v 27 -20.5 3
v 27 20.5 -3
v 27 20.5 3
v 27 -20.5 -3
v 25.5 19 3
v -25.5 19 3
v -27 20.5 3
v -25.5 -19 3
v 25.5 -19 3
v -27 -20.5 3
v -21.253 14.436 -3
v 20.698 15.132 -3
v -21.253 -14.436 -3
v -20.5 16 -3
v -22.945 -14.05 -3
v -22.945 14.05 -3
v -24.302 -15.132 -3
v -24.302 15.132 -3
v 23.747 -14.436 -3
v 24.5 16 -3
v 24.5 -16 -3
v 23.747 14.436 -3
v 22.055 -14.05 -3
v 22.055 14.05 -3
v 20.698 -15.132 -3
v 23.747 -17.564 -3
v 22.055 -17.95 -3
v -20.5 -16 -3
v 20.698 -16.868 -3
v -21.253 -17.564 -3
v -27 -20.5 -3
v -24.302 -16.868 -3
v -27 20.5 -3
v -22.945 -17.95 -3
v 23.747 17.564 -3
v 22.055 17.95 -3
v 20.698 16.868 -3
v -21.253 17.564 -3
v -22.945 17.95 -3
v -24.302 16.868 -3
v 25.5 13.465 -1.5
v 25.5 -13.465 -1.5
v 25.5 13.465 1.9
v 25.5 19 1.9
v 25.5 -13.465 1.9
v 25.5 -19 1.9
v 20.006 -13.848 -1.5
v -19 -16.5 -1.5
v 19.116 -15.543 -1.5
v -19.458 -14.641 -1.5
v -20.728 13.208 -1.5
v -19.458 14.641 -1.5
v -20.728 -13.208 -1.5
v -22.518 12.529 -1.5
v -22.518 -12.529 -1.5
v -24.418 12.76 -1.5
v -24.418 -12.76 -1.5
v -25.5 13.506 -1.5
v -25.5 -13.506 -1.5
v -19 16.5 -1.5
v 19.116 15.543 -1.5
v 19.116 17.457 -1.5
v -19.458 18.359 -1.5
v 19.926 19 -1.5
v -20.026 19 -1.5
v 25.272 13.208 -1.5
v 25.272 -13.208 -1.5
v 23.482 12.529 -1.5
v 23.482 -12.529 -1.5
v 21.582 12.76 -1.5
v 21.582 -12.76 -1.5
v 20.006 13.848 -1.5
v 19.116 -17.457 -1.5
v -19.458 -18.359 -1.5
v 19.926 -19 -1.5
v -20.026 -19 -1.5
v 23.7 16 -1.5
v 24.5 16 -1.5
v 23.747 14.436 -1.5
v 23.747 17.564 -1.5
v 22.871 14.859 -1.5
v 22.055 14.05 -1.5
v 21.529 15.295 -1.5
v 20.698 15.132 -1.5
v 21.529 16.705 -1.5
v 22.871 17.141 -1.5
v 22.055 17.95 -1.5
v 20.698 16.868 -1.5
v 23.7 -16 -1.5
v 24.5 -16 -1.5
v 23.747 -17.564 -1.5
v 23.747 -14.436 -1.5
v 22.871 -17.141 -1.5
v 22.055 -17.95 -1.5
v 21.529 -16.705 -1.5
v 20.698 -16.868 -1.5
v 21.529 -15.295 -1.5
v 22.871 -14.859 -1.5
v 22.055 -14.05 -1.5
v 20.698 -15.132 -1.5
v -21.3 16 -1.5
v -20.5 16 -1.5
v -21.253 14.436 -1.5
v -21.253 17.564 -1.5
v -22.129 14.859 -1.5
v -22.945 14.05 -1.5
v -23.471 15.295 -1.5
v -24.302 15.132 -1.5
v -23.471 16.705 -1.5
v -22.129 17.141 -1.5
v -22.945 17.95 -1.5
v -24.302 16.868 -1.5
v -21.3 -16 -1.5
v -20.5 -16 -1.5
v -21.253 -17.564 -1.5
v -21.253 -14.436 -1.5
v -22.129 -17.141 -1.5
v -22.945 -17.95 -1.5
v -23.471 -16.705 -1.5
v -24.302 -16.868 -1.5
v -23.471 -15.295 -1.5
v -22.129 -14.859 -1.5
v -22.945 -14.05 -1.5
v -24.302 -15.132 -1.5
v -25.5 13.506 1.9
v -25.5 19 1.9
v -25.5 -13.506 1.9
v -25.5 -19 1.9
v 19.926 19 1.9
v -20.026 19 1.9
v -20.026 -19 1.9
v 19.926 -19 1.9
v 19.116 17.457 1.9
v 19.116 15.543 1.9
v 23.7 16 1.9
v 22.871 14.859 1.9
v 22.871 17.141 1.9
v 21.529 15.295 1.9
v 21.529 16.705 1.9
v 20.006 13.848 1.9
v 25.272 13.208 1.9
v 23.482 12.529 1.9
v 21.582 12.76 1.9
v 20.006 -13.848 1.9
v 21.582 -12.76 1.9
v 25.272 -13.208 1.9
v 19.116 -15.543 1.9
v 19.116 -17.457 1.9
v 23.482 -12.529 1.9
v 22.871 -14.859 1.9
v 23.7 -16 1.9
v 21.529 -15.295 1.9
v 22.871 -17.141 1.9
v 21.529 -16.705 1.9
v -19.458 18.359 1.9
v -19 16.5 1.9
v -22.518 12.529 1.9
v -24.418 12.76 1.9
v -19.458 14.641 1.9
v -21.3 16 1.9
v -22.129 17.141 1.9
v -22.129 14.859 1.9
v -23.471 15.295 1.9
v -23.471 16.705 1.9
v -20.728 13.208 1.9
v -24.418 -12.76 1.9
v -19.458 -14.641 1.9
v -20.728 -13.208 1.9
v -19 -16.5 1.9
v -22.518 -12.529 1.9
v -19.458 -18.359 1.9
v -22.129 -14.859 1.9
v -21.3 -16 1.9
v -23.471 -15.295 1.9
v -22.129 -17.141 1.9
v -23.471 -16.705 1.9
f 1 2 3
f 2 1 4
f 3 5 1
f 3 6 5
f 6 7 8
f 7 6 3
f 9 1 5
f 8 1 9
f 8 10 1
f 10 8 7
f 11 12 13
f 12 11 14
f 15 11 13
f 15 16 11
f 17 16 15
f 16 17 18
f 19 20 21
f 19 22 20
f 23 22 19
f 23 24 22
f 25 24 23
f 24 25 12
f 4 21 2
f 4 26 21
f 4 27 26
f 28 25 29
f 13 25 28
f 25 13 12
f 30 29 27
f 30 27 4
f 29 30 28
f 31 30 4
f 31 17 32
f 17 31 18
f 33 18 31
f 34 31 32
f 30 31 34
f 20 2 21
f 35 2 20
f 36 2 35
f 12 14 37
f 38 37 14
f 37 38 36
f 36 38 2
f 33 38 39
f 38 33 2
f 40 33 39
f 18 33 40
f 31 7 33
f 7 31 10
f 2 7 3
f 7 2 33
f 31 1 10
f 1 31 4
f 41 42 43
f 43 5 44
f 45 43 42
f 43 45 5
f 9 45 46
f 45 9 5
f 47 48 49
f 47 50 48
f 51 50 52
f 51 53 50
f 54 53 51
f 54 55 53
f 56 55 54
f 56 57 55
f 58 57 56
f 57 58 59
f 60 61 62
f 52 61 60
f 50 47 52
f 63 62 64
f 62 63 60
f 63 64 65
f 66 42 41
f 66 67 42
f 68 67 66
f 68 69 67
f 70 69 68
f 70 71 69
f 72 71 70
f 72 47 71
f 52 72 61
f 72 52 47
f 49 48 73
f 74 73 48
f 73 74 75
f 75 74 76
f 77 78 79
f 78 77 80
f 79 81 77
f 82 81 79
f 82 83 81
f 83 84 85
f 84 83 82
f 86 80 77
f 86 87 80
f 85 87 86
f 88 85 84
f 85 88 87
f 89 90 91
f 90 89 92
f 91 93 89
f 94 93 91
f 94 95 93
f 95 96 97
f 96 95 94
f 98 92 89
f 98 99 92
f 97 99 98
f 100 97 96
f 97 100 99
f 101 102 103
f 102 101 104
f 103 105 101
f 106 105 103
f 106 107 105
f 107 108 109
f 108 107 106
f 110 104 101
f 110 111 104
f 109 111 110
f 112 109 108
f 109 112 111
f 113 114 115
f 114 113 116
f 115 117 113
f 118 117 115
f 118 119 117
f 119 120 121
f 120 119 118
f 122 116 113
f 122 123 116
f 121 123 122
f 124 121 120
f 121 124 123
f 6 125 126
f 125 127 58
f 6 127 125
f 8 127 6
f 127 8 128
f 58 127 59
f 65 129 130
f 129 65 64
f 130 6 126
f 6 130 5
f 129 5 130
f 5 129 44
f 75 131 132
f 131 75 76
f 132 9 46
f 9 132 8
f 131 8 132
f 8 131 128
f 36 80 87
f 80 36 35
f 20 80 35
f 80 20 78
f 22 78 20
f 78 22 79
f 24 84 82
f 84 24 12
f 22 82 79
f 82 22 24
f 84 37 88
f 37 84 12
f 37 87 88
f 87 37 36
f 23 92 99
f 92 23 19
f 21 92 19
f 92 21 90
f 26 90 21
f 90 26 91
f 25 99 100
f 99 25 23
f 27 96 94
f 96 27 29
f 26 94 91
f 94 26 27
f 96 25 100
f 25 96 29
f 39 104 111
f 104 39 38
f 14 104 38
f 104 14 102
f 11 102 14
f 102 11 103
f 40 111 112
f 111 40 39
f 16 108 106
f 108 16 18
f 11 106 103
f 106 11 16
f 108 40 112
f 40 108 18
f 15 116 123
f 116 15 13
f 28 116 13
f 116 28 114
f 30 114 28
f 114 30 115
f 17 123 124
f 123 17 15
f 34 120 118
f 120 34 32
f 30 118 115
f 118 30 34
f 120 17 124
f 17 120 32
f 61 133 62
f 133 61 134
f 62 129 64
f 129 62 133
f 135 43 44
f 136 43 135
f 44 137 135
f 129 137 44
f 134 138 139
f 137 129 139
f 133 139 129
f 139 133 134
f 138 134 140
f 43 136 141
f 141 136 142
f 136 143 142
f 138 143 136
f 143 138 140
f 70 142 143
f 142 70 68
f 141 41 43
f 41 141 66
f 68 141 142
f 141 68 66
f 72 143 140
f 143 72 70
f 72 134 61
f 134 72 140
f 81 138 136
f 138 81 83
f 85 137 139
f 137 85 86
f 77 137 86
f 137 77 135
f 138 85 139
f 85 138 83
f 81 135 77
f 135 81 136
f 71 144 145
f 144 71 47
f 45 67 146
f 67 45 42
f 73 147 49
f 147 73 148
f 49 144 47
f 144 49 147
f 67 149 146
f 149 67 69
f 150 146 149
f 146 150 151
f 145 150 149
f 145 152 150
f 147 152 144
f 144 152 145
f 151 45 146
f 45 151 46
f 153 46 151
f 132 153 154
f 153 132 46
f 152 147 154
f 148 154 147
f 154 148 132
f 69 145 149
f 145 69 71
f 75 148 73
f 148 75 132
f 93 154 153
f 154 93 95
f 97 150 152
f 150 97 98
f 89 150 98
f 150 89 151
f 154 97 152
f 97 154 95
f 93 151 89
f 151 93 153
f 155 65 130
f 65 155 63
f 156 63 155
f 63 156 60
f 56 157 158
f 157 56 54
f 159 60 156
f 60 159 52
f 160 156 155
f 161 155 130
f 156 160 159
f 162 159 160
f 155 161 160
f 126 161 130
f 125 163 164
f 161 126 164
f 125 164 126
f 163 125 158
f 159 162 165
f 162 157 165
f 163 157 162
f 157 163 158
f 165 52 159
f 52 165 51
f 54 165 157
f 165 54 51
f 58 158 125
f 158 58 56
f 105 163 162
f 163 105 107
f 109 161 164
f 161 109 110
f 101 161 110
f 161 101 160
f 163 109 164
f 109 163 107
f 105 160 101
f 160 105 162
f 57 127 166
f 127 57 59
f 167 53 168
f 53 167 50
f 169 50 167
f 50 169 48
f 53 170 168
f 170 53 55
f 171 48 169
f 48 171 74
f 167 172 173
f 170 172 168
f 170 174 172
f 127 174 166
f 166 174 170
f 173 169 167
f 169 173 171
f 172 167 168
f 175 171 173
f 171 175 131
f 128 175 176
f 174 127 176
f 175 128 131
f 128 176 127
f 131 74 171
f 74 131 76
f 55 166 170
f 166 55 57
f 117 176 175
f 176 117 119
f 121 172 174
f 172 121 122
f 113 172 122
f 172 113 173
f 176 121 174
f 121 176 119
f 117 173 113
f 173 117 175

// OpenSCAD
//linear_extrude(height = 5, center = true)
//    square([45,32],true);
    
extend = 2;
tolerance = 0.5;
height = 6;
    
difference(){
    difference() {
        cube([50+2*extend,37+2*extend,height],true);
        translate([0,0,1.5]) 
            cube([50 +tolerance*2,37+tolerance*2,height],true);
    }
    {
    translate([22.5,16,-4.1]) 
        cylinder(h = 6,r = 2, centre=true);
    translate([22.5,-16,-4.1]) 
        cylinder(h = 5,r = 2, centre=true);
    translate([-22.5,16,-4.1]) 
        cylinder(h = 5,r = 2, centre=true);
    translate([-22.5,-16,-4.1]) 
        cylinder(h = 5,r = 2, centre=true);
        
    }
}

screw_holes = 2.4/2;
post_size = 4;

recess = 1.6;

difference(){
    translate([23,16.5,-1.5]) 
        cylinder(h = height-recess-1,r = post_size, centre=true);
    translate([22.5,16,-5]) 
        cylinder(h = 10,r = screw_holes, centre=true);
}

difference(){
    translate([23,-16.5,-1.5]) 
        cylinder(h = height-recess-1,r = post_size, centre=true);
    translate([22.5,-16,-5]) 
        cylinder(h = 10,r = screw_holes, centre=true);
}

difference(){
    translate([-23,16.5,-1.5]) 
        cylinder(h = height-recess-1,r = post_size, centre=true);
    translate([-22.5,16,-5]) 
        cylinder(h = 10,r = screw_holes, centre=true);
}

difference(){
    translate([-23,-16.5,-1.5]) 
        cylinder(h = height-recess-1,r = post_size, centre=true);
    translate([-22.5,-16,-5]) 
        cylinder(h = 10,r = screw_holes, centre=true);
}
